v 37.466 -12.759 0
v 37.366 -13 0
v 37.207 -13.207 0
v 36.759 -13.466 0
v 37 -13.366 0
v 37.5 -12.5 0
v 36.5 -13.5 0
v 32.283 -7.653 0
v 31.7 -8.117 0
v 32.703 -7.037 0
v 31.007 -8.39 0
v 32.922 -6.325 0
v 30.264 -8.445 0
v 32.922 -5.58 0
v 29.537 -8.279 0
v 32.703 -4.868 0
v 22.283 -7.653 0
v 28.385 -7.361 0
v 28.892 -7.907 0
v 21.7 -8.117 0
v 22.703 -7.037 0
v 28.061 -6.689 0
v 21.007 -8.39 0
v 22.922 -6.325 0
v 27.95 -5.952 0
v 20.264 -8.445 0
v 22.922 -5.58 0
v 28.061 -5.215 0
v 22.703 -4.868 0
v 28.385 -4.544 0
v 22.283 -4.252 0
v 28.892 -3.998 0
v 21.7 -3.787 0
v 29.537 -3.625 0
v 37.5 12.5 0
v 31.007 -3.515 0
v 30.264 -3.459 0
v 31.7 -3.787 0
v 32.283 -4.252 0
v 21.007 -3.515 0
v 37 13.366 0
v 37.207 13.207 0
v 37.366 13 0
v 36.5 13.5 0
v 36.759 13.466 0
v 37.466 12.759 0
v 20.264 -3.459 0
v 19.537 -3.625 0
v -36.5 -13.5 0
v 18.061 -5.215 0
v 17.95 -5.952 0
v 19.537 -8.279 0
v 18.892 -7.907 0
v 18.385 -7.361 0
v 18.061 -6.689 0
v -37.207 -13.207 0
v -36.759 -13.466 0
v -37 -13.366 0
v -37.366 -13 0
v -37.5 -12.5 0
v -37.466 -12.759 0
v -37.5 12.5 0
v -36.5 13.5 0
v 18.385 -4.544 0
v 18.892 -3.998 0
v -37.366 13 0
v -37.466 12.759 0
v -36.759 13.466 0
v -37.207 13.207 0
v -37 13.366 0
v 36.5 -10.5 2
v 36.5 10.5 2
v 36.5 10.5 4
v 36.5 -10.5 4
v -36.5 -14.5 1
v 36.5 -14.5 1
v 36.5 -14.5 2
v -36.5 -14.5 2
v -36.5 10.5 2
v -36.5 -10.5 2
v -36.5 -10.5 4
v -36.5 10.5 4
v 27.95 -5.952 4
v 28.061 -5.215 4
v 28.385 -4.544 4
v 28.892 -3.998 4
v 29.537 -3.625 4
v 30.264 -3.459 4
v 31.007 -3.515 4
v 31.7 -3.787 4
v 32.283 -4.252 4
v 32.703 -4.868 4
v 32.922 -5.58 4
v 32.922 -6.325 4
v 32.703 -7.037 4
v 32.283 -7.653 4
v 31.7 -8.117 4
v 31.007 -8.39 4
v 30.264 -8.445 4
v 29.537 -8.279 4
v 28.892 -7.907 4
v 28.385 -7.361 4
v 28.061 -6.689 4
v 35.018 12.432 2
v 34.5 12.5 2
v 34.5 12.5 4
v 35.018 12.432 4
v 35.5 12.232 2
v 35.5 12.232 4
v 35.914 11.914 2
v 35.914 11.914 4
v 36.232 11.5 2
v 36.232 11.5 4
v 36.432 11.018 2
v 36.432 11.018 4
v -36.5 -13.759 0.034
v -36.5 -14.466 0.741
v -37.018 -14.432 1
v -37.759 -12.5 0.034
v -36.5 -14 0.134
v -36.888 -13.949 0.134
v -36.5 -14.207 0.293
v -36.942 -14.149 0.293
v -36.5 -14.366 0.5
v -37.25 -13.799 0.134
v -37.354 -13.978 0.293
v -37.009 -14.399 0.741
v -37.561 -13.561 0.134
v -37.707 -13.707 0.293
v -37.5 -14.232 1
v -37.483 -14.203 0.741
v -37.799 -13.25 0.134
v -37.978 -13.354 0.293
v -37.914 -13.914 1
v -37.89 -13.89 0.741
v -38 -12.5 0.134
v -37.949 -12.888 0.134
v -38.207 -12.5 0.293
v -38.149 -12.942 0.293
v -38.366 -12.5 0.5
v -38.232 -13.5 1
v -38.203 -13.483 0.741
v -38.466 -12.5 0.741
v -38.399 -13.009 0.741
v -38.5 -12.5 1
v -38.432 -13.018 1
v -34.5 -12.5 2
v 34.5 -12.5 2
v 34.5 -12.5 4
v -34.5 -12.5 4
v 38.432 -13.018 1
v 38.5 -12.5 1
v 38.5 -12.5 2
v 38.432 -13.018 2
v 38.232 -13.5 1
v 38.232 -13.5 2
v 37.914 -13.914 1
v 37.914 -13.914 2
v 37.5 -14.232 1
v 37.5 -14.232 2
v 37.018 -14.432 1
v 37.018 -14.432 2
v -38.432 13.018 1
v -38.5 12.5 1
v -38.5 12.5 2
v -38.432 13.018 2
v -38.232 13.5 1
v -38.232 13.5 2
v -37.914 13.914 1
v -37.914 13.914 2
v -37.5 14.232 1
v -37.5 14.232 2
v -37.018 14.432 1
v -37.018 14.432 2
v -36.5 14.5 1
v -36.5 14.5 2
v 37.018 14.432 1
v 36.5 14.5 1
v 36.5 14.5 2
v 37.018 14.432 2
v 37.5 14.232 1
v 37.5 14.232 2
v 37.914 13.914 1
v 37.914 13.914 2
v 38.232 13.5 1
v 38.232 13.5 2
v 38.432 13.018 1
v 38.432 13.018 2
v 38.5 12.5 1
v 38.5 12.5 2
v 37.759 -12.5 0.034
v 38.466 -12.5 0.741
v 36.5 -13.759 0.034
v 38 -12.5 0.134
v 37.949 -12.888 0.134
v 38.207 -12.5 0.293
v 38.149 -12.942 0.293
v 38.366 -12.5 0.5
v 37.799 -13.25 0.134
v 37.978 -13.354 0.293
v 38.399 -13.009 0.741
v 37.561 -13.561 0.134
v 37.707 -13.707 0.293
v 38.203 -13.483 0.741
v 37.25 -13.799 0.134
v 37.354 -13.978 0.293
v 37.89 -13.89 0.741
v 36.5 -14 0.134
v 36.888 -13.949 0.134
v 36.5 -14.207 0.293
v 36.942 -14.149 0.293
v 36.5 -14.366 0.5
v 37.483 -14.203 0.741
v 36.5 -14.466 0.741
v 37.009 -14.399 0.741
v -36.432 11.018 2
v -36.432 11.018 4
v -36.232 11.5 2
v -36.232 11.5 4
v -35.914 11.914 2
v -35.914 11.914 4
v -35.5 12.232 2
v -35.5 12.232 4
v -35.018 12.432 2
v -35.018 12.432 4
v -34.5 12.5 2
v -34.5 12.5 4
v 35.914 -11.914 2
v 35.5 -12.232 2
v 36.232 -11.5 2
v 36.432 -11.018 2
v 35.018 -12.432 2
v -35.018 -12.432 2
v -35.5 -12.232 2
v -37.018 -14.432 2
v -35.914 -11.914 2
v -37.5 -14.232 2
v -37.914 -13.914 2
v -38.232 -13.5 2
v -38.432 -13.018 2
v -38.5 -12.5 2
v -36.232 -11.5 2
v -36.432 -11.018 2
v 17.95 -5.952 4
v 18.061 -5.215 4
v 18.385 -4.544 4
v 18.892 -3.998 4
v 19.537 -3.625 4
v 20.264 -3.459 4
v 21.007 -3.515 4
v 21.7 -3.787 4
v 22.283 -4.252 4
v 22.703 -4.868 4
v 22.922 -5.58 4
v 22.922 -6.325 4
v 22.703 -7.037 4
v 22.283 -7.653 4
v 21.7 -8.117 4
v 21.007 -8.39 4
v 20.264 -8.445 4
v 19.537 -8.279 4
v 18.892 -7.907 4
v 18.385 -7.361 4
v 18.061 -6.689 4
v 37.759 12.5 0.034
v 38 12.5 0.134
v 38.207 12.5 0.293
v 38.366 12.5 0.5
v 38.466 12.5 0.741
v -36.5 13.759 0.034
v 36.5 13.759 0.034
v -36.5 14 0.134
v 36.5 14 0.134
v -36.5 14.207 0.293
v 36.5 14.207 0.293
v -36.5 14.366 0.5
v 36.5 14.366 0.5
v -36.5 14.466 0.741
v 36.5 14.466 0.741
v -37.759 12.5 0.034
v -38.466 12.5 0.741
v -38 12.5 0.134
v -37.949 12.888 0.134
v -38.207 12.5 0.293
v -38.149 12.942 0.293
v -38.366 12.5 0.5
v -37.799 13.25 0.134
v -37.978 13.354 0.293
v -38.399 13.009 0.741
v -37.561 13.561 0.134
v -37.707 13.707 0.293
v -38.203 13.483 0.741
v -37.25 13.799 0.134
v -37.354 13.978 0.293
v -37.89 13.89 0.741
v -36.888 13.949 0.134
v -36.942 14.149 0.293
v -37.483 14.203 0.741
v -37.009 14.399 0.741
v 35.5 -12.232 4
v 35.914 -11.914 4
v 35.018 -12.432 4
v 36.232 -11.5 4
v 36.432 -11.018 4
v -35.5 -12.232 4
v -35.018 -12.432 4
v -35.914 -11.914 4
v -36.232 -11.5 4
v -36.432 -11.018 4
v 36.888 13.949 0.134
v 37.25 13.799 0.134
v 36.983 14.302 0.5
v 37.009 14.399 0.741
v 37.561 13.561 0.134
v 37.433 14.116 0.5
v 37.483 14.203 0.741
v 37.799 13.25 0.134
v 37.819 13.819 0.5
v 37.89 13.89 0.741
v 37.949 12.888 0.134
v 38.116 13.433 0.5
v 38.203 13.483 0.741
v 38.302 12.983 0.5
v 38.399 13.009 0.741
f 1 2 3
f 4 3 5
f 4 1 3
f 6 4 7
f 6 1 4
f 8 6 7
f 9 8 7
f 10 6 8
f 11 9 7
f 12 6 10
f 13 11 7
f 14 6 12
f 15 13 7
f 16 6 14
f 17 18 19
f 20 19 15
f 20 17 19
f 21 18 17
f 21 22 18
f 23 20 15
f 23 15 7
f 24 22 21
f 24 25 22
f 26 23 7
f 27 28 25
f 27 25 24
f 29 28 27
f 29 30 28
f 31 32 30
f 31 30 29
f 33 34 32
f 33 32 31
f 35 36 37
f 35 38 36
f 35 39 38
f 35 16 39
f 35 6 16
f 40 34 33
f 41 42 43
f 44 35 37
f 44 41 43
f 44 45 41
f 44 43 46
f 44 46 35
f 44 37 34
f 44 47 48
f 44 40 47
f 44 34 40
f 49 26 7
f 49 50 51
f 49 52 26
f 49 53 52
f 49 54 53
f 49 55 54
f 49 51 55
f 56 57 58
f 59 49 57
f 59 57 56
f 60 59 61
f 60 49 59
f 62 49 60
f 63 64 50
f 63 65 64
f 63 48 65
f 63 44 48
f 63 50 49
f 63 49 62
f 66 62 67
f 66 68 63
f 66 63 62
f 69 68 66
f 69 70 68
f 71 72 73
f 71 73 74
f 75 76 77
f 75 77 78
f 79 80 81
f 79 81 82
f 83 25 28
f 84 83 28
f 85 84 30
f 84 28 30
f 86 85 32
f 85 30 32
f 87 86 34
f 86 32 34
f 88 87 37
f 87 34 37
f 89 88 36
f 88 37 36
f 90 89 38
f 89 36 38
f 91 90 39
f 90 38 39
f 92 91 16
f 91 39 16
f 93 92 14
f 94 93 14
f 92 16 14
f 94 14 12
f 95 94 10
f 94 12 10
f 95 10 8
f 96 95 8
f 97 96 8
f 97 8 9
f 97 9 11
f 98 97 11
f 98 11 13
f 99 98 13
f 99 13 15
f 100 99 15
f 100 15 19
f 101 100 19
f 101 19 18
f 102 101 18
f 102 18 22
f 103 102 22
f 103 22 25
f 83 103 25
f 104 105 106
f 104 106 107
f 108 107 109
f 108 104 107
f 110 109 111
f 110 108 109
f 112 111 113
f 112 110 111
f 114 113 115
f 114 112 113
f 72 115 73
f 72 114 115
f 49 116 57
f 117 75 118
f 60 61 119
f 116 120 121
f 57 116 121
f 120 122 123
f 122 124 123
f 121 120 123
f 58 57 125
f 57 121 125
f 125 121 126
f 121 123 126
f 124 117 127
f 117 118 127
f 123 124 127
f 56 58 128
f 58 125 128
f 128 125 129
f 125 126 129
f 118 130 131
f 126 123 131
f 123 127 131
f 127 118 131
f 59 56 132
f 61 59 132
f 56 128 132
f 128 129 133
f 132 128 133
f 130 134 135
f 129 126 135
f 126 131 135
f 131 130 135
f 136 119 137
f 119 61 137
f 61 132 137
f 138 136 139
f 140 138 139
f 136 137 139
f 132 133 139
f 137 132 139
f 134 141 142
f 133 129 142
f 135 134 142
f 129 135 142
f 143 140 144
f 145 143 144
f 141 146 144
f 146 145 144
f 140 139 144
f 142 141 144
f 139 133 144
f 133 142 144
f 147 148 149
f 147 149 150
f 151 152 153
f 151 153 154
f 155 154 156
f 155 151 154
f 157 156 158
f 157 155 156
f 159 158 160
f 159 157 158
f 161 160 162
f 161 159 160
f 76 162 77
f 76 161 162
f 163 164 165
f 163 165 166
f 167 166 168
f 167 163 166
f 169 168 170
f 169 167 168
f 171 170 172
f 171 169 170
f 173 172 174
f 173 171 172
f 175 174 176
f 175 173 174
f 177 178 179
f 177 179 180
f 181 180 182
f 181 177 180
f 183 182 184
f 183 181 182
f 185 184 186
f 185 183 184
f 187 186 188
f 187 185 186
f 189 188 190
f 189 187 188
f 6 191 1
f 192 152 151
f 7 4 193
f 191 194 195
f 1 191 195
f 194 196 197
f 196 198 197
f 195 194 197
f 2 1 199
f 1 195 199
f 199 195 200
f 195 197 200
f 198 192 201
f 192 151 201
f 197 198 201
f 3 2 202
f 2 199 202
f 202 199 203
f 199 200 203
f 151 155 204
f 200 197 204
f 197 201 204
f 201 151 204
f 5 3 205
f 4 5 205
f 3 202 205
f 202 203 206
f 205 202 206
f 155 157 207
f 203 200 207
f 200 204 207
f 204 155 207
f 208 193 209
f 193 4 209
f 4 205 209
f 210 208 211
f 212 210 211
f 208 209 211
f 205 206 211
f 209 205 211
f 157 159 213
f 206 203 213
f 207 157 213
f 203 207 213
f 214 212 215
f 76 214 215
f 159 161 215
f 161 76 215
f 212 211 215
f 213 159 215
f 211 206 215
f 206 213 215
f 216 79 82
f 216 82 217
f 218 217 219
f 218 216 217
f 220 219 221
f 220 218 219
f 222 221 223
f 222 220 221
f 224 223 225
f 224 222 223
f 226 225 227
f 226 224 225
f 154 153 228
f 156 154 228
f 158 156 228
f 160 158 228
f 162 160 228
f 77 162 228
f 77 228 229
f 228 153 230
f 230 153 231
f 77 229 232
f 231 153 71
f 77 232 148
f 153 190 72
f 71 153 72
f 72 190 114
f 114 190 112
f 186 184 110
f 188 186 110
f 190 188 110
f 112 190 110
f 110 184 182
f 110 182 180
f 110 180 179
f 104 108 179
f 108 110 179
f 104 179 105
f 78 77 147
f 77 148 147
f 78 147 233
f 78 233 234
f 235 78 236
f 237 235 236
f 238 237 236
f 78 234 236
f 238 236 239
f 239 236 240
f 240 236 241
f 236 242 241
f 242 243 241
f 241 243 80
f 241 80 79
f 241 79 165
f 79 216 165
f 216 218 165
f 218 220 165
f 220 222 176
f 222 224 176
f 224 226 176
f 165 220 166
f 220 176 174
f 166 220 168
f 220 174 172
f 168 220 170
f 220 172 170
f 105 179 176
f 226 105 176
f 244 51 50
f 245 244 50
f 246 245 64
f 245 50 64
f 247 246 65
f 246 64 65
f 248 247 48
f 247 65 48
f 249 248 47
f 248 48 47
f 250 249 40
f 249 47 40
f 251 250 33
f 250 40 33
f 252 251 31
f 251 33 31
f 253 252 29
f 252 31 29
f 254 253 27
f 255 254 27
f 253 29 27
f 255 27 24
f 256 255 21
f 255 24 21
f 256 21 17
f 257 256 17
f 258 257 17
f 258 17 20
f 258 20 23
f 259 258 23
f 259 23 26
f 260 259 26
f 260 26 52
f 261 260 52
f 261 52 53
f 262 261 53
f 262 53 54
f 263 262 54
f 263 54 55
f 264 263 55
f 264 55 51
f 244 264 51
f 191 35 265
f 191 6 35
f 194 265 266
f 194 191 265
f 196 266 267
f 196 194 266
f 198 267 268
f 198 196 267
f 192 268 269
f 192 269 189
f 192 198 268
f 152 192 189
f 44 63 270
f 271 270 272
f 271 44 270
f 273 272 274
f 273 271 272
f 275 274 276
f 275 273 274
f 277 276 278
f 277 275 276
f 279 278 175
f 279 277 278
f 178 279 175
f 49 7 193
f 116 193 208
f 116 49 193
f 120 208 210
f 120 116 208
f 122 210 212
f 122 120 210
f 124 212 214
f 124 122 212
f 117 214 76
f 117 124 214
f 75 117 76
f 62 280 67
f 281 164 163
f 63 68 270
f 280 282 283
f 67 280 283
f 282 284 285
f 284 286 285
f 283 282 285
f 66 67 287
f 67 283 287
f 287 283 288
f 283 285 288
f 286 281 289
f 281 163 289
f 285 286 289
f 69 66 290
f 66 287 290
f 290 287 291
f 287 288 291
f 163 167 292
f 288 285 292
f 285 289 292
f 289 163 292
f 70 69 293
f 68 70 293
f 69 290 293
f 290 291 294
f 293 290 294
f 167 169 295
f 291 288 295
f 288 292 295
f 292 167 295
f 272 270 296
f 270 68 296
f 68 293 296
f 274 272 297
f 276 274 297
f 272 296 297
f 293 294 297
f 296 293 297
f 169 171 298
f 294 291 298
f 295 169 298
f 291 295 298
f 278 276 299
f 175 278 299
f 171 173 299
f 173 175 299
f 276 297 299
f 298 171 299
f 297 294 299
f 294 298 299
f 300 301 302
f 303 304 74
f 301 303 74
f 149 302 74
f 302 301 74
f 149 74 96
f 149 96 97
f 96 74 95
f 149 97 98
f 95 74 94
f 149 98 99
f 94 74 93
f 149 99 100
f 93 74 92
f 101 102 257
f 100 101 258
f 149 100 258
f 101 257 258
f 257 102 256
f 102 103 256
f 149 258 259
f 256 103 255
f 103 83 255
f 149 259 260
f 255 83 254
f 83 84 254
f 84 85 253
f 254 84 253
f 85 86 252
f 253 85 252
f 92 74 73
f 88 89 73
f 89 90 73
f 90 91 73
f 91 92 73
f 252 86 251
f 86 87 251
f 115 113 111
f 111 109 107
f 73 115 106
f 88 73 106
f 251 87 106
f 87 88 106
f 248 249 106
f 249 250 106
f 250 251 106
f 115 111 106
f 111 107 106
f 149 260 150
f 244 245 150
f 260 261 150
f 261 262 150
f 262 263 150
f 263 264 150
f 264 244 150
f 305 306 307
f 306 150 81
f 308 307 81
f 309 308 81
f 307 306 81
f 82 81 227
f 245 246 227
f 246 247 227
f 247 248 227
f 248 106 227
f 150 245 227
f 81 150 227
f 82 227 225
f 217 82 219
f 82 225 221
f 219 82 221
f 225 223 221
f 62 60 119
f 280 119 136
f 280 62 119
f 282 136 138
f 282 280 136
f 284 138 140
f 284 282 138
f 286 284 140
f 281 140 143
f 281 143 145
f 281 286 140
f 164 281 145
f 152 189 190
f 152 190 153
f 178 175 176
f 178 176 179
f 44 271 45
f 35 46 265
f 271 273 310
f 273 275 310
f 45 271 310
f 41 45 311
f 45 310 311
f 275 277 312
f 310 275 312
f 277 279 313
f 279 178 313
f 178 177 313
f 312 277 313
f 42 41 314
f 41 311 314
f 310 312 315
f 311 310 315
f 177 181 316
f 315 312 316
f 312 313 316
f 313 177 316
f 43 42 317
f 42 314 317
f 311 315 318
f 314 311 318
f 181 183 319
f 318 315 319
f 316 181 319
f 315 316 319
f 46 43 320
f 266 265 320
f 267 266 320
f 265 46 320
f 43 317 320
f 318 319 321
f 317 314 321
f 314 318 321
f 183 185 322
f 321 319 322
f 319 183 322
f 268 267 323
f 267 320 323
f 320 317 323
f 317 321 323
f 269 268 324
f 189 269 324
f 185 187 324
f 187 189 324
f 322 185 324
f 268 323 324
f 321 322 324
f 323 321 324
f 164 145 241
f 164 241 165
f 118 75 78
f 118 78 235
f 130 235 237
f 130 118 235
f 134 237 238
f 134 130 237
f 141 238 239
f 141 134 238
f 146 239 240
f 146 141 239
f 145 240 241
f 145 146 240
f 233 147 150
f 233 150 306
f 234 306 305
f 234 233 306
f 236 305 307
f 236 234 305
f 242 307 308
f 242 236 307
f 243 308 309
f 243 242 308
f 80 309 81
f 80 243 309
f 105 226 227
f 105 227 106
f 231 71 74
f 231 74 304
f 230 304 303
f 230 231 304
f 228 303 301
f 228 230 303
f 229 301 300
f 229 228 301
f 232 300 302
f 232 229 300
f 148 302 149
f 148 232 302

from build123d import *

# Parameters (mm, degrees)
BOSS_EXTRUDE1_DEPTH = 2
BOSS_EXTRUDE2_DEPTH = 2
SKETCH3_R           = 2.5
CUT_EXTRUDE1_DEPTH  = 10
FILLET1_R           = 1


with BuildPart() as part:
    # Sketch1 → Boss-Extrude1 (new body)
    with BuildSketch(Plane.XY):
        with BuildLine():
            Line((36.5, -14.5), (-36.5, -14.5))
            ThreePointArc((-36.5, -14.5), (-37.914213562, -13.914213562), (-38.5, -12.5))
            Line((-38.5, -12.5), (-38.5, 12.5))
            ThreePointArc((-38.5, 12.5), (-37.914213562, 13.914213562), (-36.5, 14.5))
            Line((-36.5, 14.5), (36.5, 14.5))
            ThreePointArc((36.5, 14.5), (37.914213562, 13.914213562), (38.5, 12.5))
            Line((38.5, 12.5), (38.5, -12.5))
            ThreePointArc((38.5, -12.5), (37.914213562, -13.914213562), (36.5, -14.5))
        make_face()
    extrude(amount=BOSS_EXTRUDE1_DEPTH)

    # Sketch2 → Boss-Extrude2 (add)
    with BuildSketch(Plane.XY.offset(2)):
        with BuildLine():
            Line((34.5, -12.5), (-34.5, -12.5))
            ThreePointArc((-34.5, -12.5), (-35.914213562, -11.914213562), (-36.5, -10.5))
            Line((-36.5, -10.5), (-36.5, 10.5))
            ThreePointArc((-36.5, 10.5), (-35.914213562, 11.914213562), (-34.5, 12.5))
            Line((-34.5, 12.5), (34.5, 12.5))
            ThreePointArc((34.5, 12.5), (35.914213562, 11.914213562), (36.5, 10.5))
            Line((36.5, 10.5), (36.5, -10.5))
            ThreePointArc((36.5, -10.5), (35.914213562, -11.914213562), (34.5, -12.5))
        make_face()
    extrude(amount=BOSS_EXTRUDE2_DEPTH)

    # Sketch3 → Cut-Extrude1 (cut)
    with BuildSketch(Plane(origin=(0, 0, 0), x_dir=(-1, 0, 0), z_dir=(0, 0, -1))):
        with Locations((-30.450412323, -5.952241092)):
            Circle(SKETCH3_R)
        with Locations((-20.450412323, -5.952241092)):
            Circle(SKETCH3_R)
    extrude(amount=-CUT_EXTRUDE1_DEPTH, mode=Mode.SUBTRACT)

    # Fillet1
    fillet1_edges = [part.edges().sort_by_distance(p)[0] for p in [
        (38.5, 0, 0),
        (37.914213562, -13.914213562, 0),
        (0, -14.5, 0),
        (-37.914213562, -13.914213562, 0),
        (-38.5, 0, 0),
        (-37.914213562, 13.914213562, 0),
        (0, 14.5, 0),
        (37.914213562, 13.914213562, 0),
    ]]
    fillet(fillet1_edges, radius=FILLET1_R)


solid = part.part
